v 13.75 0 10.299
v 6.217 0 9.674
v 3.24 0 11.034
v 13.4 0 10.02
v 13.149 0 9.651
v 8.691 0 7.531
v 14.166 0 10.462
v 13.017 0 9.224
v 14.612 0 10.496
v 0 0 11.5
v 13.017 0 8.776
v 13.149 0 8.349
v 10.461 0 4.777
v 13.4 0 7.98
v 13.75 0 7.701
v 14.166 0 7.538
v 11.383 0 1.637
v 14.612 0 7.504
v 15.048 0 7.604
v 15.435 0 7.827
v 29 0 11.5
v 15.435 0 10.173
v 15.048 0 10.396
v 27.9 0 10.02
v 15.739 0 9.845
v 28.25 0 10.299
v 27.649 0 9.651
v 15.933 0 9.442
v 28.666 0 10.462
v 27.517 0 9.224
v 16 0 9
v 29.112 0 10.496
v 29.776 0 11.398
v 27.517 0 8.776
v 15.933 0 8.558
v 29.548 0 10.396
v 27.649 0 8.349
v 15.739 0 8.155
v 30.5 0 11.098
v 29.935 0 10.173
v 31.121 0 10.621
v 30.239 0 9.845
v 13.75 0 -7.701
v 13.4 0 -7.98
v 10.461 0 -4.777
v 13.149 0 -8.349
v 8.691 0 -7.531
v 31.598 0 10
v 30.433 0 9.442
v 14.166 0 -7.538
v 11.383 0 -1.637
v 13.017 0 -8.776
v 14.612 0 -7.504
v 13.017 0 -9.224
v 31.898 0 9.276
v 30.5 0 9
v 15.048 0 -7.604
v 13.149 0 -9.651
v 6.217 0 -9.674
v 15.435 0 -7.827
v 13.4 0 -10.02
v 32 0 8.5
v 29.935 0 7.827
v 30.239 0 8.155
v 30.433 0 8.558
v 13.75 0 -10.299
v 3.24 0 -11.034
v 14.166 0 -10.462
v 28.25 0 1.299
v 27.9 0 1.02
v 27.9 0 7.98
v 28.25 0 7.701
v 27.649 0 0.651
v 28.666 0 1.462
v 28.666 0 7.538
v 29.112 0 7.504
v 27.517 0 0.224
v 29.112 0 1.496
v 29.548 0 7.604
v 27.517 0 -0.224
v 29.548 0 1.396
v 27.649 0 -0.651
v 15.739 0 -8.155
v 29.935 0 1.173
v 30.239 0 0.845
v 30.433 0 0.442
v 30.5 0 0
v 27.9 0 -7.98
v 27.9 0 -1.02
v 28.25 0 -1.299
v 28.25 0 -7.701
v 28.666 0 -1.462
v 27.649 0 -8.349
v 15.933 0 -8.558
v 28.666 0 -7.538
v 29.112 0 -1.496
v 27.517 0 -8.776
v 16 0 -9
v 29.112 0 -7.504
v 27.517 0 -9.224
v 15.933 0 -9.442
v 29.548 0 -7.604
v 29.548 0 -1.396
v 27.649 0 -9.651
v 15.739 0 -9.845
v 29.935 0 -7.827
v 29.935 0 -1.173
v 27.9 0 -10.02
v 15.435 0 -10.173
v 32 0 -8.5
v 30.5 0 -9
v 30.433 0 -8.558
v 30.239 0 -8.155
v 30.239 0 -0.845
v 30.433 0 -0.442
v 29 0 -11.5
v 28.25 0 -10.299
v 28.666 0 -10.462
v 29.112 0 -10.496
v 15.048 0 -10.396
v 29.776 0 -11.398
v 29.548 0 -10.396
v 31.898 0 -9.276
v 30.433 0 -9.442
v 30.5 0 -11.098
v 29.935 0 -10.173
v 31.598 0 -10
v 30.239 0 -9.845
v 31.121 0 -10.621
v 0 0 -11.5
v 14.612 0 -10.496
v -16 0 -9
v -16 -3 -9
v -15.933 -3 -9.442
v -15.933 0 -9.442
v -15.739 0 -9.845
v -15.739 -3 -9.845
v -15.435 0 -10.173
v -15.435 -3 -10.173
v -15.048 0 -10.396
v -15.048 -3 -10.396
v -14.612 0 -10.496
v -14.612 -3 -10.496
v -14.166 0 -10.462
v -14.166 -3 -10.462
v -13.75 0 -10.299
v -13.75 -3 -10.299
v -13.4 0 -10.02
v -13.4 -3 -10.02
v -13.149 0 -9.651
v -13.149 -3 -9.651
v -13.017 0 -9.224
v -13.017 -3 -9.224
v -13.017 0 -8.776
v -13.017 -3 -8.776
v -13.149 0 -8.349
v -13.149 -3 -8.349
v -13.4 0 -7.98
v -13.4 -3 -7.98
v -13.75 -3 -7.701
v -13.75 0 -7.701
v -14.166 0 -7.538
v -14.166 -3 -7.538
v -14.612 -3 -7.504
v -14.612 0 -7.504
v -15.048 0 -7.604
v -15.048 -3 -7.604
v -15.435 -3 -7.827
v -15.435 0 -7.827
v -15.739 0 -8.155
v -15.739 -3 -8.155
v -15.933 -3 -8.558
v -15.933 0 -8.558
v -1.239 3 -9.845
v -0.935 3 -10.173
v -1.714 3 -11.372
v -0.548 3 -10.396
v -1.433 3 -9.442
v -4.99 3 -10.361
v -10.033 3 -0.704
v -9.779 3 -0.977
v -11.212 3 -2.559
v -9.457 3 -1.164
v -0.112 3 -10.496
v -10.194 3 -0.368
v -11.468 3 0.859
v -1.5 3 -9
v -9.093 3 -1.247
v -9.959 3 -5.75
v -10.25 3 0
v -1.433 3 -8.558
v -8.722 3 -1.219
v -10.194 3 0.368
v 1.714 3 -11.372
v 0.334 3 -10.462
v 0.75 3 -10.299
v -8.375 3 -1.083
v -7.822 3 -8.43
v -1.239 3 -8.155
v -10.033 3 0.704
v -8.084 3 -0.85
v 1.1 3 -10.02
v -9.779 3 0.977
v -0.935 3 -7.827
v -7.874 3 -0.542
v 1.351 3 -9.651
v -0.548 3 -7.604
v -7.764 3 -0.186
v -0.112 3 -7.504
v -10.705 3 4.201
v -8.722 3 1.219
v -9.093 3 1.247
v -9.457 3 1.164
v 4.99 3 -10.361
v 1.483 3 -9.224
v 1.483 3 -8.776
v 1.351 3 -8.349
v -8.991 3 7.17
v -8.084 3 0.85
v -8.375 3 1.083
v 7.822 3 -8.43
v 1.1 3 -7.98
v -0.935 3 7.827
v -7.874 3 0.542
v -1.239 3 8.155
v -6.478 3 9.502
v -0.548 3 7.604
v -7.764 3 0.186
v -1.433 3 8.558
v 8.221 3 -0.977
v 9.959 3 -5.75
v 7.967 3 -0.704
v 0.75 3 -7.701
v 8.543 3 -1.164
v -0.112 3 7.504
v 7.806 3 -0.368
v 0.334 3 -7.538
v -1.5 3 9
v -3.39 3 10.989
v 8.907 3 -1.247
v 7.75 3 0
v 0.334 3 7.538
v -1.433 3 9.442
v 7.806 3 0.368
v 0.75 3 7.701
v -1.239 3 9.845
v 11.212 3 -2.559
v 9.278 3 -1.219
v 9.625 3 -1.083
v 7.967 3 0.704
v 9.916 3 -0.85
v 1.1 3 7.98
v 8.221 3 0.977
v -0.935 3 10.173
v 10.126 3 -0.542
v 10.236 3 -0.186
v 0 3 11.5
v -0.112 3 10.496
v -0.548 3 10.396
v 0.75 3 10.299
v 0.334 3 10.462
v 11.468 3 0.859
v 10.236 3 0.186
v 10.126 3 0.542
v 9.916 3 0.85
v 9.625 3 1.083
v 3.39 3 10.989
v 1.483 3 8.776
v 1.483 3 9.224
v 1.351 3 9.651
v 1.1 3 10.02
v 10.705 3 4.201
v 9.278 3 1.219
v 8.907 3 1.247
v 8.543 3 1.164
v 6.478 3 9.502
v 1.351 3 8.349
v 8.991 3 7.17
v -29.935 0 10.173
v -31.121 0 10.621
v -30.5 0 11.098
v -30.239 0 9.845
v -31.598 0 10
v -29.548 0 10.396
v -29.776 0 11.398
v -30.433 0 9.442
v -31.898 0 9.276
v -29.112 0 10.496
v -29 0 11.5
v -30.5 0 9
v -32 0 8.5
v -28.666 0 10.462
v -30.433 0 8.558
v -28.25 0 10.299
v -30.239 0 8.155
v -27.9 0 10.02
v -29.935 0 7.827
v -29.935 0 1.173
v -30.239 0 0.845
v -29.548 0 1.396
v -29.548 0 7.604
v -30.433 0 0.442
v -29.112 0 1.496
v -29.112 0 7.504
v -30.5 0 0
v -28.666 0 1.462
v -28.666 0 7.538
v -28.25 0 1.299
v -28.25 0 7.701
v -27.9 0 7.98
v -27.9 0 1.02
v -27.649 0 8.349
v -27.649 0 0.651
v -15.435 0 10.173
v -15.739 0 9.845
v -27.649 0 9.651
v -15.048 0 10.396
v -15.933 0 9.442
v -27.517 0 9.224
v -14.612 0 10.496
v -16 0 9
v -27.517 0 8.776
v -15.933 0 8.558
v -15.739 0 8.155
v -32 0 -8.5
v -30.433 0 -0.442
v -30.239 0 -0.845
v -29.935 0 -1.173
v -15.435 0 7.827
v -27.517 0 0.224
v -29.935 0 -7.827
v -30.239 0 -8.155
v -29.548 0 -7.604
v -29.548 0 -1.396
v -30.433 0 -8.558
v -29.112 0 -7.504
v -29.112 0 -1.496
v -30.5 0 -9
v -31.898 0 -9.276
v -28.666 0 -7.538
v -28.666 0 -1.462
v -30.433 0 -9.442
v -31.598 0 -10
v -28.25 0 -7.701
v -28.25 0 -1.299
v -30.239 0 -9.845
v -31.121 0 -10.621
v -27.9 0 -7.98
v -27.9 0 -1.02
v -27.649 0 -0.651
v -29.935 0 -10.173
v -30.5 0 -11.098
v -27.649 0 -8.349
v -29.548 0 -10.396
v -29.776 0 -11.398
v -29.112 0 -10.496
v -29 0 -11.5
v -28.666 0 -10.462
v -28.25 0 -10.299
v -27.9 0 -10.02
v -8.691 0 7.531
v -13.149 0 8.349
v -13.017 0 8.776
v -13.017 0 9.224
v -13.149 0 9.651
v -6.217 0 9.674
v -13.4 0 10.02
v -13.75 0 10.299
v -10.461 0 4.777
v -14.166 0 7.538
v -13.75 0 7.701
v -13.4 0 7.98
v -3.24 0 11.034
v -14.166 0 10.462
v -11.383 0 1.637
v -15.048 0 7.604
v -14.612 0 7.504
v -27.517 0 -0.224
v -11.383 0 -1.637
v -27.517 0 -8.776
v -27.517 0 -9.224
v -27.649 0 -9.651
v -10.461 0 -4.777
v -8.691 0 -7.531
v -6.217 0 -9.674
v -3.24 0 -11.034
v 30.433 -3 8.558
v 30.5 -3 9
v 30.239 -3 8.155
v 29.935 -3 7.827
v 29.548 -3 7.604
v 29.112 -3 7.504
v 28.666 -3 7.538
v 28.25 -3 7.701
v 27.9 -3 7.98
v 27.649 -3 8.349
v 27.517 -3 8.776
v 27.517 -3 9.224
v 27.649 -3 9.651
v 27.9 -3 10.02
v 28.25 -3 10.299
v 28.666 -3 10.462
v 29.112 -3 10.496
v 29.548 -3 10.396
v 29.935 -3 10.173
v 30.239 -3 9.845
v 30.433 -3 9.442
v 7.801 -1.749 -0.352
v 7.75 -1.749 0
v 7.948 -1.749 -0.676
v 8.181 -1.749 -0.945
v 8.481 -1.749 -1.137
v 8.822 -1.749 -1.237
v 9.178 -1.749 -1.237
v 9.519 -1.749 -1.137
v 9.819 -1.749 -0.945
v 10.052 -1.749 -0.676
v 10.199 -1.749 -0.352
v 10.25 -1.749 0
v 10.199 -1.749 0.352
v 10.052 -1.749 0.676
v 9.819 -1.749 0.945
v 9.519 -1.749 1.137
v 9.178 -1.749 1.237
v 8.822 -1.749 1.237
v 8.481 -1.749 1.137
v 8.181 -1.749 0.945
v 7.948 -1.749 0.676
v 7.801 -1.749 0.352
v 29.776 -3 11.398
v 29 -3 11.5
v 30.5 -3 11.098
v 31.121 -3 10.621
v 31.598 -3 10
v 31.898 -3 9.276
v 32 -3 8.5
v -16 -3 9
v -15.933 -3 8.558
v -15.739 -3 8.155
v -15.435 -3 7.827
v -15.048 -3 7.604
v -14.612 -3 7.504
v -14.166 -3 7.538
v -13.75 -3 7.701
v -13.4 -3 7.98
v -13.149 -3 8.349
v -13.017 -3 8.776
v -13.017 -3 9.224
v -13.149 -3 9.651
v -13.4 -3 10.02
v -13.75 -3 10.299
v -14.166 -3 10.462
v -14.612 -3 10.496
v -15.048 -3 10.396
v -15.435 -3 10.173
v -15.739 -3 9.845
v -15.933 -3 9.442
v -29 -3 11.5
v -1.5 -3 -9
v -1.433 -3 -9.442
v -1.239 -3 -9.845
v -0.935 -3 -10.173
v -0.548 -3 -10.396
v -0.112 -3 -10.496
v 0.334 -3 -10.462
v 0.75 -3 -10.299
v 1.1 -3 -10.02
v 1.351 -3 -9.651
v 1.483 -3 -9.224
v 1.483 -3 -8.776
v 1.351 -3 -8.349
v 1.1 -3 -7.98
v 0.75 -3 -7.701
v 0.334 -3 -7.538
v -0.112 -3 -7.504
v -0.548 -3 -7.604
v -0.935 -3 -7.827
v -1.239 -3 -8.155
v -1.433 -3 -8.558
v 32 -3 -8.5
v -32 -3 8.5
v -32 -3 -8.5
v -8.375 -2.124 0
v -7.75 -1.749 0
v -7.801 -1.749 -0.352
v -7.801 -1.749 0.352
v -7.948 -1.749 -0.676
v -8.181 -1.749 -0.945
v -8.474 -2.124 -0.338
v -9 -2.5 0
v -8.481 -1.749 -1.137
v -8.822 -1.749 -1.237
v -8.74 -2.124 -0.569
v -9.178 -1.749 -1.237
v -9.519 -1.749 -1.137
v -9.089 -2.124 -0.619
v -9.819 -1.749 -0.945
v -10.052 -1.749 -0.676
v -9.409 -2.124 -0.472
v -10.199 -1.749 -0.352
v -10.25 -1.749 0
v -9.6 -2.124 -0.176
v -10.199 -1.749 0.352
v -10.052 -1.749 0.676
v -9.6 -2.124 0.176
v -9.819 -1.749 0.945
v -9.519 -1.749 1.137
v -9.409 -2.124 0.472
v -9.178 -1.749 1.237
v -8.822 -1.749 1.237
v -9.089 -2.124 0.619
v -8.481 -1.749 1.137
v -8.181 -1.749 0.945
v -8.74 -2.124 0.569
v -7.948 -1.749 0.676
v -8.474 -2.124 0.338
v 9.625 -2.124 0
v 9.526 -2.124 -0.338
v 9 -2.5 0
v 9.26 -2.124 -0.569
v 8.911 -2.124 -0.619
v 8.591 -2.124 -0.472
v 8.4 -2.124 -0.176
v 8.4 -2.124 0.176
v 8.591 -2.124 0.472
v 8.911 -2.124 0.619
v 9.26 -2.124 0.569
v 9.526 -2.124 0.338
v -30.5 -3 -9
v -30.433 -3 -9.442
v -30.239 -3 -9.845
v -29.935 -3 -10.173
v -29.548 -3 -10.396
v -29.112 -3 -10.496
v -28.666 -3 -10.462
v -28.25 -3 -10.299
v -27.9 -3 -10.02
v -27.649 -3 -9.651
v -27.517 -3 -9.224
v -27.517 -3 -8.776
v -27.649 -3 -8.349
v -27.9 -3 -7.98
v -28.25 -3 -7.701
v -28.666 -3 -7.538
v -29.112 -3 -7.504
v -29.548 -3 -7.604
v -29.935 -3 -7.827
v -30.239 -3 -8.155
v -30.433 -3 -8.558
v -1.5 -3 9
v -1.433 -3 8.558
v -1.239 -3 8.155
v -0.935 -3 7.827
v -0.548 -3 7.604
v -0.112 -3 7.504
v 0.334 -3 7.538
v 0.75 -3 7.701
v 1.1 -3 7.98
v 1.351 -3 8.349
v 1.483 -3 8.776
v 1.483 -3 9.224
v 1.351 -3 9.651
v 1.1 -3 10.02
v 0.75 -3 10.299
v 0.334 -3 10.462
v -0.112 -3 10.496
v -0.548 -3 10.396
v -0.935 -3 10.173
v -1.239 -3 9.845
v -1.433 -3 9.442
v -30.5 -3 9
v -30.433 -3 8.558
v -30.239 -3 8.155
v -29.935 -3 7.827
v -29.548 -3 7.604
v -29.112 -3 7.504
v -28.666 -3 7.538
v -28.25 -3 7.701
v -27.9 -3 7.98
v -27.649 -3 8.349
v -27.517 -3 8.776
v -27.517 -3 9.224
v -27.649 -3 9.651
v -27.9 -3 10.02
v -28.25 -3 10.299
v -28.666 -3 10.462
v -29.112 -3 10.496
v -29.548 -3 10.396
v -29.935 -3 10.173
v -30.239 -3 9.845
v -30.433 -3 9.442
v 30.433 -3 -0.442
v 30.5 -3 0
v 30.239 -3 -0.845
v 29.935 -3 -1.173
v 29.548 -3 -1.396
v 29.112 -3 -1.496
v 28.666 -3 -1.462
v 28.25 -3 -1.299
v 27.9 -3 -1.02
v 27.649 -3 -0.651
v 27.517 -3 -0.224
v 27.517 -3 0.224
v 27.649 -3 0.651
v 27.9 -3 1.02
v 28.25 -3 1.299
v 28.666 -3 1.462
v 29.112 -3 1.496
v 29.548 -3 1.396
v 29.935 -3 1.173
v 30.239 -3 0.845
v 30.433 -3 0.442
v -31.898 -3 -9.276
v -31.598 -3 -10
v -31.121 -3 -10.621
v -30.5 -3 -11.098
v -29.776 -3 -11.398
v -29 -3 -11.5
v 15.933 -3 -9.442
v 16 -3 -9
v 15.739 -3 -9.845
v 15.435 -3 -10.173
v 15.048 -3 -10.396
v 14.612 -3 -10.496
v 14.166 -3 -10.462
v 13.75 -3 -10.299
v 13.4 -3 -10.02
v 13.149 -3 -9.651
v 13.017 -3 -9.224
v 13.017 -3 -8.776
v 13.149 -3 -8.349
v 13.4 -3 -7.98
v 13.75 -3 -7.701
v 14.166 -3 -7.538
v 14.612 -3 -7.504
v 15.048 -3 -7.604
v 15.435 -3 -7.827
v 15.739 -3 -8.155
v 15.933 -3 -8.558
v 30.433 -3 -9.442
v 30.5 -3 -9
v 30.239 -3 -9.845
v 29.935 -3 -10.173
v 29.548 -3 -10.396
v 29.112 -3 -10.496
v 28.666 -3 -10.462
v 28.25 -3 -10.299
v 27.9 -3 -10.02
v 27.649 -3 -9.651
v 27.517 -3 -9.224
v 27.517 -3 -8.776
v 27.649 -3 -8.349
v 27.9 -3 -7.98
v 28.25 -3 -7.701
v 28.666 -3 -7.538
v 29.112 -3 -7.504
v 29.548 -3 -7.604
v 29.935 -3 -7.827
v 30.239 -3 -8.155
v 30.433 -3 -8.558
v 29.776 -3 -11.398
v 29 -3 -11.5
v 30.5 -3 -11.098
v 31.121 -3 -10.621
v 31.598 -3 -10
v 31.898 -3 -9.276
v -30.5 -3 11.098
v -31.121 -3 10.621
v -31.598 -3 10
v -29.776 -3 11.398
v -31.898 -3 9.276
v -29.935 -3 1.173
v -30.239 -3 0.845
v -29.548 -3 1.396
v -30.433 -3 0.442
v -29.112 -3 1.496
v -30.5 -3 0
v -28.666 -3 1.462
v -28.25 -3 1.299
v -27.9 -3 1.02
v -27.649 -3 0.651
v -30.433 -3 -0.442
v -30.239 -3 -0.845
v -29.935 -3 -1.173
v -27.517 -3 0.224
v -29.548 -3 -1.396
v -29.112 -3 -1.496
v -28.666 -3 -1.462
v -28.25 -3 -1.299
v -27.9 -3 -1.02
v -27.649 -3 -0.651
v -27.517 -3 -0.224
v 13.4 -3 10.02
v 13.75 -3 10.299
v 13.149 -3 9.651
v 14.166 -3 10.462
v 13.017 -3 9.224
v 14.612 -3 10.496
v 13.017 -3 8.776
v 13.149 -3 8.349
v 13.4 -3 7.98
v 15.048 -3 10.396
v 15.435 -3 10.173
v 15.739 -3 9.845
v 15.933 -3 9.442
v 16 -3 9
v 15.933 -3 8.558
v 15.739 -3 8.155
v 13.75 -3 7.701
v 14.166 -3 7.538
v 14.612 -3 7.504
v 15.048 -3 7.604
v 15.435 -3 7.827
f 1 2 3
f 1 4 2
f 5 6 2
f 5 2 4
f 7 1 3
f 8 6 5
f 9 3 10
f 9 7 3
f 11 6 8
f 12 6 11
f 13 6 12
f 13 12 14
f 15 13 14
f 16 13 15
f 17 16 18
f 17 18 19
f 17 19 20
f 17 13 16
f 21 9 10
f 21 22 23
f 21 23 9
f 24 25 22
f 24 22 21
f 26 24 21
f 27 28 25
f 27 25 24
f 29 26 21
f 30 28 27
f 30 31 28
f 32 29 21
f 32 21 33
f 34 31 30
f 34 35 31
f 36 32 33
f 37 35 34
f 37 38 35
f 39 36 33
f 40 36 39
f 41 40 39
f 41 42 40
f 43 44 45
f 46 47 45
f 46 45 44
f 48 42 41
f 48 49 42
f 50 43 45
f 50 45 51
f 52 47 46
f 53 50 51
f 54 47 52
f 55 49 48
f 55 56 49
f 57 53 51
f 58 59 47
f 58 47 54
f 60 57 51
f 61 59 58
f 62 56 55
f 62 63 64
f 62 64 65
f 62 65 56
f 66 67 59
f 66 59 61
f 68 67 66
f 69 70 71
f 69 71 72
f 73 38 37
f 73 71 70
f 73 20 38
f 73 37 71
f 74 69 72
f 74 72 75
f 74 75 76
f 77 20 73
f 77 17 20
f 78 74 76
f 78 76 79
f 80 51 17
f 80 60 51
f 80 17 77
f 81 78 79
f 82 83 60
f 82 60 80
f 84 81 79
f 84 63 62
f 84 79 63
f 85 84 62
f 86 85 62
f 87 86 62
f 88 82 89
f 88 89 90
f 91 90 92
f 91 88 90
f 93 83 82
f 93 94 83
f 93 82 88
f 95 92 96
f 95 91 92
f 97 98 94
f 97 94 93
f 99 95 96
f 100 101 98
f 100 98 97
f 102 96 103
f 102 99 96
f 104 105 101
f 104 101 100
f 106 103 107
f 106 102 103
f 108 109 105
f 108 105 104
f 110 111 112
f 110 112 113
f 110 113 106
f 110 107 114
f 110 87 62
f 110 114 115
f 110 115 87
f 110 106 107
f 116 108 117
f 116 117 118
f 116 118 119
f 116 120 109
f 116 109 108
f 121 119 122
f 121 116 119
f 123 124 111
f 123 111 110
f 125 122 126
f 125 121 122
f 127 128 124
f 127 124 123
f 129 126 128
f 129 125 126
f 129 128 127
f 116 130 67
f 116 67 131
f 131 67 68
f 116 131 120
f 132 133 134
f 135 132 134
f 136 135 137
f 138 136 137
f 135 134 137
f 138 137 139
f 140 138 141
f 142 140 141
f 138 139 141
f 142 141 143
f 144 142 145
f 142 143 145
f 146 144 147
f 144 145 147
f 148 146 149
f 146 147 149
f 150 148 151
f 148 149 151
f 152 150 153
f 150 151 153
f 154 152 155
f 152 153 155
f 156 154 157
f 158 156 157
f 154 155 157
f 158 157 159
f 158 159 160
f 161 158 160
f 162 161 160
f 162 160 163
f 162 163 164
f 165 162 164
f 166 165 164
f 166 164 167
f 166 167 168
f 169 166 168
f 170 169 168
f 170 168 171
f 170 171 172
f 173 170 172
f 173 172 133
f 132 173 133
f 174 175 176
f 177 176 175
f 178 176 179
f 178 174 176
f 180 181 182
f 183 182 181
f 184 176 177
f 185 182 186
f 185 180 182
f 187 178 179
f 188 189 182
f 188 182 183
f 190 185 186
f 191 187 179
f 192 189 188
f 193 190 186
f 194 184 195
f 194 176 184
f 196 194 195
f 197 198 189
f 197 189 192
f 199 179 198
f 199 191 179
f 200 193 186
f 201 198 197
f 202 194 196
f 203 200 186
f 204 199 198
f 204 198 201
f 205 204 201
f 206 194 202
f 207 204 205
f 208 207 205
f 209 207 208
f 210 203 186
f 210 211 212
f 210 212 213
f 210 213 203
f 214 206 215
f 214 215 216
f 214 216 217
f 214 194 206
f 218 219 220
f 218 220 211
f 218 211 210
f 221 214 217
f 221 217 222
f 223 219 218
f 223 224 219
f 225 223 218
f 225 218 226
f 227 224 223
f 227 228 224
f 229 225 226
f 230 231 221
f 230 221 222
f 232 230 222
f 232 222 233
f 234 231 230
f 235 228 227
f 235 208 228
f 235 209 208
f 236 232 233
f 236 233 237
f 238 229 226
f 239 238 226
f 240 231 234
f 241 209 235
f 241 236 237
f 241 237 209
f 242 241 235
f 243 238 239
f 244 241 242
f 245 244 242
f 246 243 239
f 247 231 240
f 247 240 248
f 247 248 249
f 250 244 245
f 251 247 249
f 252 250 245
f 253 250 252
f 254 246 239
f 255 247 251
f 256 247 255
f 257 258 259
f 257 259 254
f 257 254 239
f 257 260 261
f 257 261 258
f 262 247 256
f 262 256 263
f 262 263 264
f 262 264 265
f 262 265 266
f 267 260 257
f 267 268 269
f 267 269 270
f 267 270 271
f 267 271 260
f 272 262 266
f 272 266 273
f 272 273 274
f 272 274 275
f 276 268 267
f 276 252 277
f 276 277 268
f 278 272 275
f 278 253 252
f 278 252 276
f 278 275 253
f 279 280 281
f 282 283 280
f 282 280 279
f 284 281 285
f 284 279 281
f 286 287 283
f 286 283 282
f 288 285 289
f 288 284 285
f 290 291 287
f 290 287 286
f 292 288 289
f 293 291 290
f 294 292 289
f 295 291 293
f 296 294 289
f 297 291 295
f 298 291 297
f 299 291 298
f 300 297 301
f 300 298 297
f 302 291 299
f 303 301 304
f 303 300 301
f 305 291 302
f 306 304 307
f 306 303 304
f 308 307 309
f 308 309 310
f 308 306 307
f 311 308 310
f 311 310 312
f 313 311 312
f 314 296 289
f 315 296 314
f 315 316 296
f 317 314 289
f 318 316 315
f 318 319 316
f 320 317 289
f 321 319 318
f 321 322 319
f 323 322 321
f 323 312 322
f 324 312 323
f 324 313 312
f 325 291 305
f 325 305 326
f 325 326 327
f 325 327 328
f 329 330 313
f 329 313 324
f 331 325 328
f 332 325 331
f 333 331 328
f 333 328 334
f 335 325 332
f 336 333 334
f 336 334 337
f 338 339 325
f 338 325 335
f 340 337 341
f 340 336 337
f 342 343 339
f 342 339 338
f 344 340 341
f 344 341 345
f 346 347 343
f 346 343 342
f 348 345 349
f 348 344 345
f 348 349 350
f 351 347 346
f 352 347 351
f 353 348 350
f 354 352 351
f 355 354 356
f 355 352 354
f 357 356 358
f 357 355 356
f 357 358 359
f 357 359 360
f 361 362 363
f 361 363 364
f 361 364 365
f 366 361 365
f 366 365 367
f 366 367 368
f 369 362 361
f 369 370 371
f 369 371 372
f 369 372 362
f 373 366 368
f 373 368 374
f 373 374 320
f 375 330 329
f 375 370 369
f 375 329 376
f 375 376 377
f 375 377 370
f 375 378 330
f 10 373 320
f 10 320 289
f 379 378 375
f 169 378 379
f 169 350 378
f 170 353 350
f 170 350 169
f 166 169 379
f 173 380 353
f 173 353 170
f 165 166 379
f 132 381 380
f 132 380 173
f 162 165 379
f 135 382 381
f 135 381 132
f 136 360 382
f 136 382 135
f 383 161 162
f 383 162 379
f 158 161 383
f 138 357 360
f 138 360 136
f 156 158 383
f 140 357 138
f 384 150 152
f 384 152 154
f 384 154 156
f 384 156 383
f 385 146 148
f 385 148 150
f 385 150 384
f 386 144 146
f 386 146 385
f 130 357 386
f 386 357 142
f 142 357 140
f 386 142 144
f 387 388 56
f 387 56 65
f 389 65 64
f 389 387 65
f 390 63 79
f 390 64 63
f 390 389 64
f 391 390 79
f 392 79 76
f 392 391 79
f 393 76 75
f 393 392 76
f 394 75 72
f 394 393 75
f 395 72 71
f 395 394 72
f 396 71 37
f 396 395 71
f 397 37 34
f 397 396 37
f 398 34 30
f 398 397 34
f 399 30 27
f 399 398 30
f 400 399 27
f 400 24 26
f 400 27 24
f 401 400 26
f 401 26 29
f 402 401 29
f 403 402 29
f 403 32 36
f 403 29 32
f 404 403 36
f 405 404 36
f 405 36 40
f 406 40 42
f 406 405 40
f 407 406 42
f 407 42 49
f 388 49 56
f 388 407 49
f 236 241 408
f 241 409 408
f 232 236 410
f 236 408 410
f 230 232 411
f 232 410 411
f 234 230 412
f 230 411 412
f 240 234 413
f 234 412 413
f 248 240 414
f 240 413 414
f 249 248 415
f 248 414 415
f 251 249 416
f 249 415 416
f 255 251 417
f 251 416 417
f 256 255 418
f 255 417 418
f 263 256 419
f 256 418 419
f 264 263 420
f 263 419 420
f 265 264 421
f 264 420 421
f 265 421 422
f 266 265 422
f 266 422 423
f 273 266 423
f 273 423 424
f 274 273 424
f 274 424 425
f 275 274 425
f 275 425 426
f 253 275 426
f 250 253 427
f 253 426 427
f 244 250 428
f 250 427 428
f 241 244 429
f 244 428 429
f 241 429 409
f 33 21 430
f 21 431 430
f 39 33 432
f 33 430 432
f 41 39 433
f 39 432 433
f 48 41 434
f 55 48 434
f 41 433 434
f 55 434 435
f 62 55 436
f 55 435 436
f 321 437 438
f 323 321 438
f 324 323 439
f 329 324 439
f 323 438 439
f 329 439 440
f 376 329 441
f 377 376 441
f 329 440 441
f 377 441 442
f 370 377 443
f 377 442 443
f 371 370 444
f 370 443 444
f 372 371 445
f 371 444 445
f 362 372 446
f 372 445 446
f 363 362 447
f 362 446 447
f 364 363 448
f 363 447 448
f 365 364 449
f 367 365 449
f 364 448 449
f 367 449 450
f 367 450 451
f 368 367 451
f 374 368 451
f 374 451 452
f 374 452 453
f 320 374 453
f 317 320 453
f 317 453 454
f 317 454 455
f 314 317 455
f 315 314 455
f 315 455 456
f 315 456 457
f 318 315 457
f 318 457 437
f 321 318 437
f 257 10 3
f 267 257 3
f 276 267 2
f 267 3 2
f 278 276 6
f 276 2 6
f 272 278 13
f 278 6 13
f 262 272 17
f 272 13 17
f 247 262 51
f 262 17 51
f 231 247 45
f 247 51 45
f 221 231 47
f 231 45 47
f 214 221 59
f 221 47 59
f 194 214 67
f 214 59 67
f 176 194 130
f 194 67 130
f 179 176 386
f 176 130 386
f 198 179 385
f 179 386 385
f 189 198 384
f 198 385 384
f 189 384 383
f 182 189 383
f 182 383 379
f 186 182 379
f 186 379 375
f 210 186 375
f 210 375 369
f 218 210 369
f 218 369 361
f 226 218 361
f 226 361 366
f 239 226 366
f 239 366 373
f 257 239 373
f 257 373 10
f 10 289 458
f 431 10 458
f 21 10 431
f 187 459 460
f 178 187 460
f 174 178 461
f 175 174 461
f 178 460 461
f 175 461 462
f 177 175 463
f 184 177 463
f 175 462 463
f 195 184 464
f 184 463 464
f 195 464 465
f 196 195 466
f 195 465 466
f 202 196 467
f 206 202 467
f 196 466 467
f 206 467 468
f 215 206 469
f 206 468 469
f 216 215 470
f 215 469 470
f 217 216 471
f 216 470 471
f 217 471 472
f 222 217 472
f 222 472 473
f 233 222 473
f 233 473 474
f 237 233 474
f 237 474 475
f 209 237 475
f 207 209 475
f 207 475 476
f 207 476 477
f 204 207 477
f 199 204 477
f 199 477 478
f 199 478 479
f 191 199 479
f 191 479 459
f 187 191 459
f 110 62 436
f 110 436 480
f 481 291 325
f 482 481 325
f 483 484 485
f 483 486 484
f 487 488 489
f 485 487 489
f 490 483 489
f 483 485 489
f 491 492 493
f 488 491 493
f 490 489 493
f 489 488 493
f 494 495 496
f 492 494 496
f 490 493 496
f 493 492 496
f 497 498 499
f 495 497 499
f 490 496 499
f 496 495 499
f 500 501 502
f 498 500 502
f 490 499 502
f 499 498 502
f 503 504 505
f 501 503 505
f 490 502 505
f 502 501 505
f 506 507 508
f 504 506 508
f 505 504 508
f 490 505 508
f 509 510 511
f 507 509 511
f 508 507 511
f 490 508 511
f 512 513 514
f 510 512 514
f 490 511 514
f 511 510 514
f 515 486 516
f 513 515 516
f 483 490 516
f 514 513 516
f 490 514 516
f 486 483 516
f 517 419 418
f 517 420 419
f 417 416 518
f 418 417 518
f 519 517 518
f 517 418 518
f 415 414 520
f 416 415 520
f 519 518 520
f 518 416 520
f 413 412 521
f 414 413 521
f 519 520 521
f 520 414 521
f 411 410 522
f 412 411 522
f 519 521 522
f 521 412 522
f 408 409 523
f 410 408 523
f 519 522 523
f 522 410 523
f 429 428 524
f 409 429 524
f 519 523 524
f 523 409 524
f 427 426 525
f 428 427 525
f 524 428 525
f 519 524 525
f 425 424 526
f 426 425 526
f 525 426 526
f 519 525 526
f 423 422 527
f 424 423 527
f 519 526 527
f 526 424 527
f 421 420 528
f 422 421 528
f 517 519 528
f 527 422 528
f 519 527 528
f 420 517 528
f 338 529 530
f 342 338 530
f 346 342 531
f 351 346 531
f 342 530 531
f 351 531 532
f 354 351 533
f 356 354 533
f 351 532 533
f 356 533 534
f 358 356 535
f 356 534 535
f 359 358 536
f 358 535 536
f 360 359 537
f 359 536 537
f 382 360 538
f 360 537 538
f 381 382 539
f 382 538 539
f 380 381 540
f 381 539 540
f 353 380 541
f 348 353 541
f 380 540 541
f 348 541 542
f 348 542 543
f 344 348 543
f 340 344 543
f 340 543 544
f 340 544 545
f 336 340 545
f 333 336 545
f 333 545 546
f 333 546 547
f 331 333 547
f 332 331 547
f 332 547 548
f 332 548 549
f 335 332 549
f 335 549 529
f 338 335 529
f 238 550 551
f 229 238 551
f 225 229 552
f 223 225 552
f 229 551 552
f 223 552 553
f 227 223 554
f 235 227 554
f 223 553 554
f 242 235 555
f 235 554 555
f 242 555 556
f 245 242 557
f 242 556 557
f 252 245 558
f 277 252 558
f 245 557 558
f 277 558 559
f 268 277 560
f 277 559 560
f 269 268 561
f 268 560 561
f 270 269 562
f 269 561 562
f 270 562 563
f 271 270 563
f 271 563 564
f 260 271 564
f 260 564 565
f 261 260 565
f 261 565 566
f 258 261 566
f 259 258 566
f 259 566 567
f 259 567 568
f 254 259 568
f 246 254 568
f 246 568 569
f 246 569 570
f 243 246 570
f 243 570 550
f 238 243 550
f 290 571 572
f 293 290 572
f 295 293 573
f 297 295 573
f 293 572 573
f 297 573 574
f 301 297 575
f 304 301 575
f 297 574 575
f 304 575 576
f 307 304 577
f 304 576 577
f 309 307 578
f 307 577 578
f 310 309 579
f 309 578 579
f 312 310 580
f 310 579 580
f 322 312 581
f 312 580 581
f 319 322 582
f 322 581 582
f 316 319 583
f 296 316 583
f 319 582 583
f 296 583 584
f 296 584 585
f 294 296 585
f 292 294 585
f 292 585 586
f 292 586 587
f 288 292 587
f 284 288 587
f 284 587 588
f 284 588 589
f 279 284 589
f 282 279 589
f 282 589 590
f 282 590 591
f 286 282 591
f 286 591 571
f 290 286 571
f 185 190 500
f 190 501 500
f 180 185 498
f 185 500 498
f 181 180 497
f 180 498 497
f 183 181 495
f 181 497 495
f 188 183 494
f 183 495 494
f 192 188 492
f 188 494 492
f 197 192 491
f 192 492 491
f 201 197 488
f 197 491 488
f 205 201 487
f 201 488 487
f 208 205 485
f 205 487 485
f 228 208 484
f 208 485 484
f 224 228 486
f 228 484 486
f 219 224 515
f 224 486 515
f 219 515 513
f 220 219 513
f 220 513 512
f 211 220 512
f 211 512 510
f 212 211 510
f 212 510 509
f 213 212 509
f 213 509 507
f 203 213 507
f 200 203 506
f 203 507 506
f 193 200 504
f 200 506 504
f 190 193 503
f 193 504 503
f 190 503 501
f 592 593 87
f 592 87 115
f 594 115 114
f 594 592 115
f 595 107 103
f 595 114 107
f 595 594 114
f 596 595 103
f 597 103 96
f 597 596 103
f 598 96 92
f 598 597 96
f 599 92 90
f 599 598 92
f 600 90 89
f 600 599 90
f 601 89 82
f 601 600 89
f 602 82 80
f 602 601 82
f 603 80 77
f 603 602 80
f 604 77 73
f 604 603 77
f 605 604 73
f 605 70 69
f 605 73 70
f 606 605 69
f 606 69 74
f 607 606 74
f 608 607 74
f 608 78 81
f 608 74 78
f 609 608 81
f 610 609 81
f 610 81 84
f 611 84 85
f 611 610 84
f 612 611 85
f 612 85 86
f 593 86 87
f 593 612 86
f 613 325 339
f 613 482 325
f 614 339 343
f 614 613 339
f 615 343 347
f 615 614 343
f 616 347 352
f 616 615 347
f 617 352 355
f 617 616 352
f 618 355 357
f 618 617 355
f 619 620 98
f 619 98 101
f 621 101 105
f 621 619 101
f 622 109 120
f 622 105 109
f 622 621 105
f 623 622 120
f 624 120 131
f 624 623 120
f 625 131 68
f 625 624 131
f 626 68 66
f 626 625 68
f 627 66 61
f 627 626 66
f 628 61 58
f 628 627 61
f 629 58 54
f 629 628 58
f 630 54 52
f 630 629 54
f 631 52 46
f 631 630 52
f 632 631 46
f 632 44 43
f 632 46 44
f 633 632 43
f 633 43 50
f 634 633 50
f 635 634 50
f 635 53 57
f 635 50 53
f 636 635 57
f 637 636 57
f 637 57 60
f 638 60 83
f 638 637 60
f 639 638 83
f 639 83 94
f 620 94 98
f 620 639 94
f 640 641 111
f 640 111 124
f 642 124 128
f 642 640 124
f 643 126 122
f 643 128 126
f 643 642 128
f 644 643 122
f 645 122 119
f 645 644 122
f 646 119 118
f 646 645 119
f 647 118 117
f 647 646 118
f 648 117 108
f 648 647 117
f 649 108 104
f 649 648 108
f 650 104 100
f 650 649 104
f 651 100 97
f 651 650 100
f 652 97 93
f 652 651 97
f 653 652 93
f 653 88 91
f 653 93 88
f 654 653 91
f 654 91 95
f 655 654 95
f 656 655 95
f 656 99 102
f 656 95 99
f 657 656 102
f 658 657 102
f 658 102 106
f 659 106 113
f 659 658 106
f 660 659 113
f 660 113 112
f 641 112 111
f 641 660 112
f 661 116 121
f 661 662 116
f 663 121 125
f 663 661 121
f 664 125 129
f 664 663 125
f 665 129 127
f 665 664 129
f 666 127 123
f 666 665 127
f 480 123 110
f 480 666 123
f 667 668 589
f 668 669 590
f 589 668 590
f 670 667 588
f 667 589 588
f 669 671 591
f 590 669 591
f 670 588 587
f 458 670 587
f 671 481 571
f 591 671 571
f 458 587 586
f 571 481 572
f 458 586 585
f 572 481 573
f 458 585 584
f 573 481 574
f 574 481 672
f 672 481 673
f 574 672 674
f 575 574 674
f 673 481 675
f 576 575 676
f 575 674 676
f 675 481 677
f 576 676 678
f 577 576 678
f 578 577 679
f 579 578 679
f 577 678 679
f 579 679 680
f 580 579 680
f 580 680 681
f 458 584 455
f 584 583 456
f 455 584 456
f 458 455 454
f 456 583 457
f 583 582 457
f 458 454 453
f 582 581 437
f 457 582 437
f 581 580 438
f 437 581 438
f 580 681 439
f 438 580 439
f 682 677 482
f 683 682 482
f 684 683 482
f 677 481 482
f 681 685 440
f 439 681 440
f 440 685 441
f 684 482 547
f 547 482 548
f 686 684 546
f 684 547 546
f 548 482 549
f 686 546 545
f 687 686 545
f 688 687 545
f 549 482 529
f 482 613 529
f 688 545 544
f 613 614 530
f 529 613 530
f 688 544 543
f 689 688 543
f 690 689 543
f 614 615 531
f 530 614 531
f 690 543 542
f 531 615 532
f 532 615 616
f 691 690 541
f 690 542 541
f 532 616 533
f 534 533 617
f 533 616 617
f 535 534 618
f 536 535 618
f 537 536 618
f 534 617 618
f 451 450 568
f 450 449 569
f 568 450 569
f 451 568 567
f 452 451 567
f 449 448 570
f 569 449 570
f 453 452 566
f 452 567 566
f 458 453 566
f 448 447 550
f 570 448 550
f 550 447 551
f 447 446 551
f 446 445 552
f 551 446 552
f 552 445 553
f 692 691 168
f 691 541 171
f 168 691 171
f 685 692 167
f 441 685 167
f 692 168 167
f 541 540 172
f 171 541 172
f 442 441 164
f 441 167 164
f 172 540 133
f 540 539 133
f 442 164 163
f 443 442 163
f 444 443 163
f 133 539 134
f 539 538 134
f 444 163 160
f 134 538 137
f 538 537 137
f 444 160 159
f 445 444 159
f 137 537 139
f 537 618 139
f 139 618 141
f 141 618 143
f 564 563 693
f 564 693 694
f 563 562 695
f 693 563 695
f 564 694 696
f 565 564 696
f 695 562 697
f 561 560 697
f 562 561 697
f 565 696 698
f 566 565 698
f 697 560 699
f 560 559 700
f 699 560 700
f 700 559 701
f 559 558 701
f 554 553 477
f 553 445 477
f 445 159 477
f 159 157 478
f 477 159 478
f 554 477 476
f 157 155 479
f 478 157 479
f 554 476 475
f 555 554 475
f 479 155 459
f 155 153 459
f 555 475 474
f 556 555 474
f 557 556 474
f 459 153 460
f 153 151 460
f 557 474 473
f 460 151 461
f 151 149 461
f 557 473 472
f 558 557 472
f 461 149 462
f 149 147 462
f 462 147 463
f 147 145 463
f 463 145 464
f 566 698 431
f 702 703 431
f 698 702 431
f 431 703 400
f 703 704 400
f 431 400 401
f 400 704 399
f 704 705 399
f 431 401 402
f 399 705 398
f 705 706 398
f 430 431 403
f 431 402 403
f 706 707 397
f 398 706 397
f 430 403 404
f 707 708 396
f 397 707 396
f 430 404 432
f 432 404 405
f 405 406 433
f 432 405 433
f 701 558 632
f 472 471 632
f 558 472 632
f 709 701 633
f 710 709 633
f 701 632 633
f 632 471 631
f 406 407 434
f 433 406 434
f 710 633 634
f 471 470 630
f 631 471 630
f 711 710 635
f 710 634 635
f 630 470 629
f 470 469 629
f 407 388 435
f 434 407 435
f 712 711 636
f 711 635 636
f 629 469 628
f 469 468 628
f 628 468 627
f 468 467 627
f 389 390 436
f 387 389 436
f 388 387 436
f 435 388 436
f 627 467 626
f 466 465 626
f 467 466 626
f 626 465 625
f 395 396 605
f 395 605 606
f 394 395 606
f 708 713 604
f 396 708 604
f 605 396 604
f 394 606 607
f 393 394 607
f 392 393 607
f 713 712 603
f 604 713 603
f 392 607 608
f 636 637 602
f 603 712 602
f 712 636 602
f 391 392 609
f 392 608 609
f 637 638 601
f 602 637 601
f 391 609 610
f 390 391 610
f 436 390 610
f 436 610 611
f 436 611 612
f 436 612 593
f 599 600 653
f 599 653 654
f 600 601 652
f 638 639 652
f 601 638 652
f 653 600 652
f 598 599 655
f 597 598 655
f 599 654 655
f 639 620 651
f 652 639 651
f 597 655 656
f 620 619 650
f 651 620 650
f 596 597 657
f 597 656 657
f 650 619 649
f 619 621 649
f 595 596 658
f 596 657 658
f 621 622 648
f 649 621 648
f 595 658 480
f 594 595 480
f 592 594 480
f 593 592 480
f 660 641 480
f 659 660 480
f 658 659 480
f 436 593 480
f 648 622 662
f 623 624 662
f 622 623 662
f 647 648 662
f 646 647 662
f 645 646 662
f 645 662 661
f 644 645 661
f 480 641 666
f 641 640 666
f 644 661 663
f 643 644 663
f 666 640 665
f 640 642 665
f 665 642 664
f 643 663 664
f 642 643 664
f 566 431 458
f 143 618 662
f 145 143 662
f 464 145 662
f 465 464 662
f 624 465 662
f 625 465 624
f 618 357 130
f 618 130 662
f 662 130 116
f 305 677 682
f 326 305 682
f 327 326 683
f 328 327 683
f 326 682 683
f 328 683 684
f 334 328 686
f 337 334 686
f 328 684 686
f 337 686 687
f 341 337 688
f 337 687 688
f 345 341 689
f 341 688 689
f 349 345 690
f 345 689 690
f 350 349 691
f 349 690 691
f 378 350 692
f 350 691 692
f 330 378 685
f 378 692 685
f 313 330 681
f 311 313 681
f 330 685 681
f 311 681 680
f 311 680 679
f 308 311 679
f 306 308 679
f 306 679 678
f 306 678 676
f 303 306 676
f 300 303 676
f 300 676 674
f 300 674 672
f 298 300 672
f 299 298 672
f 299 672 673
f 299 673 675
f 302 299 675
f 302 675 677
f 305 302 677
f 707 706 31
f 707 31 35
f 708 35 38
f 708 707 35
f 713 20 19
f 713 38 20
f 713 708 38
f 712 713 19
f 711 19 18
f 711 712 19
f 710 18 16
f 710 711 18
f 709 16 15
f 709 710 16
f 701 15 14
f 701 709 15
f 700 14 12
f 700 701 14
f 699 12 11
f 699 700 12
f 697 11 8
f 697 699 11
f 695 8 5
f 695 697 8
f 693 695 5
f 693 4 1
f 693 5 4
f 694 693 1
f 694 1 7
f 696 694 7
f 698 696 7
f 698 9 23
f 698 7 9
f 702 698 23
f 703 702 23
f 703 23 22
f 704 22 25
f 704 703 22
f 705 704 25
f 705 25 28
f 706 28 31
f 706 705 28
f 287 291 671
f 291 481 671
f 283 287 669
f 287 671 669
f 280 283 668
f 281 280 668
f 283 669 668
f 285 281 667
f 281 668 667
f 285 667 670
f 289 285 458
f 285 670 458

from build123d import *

# Parameters (mm, degrees)
SKETCH1_W                 = 64
SKETCH1_H                 = 23
BOSS_EXTRUDE1_DEPTH       = 3
F_3_0_3_DIAMETER_HOLE1_D  = 3
FILLET1_R                 = 3
SKETCH5_R                 = 11.5
BOSS_EXTRUDE2_DEPTH       = 3
F_3_0_3_DIAMETER_HOLE2_D  = 3
M3X0_5_TAPPED_HOLE1_D     = 2.5
M3X0_5_TAPPED_HOLE1_DEPTH = 4.748924226
M3X0_5_TAPPED_HOLE1_TIP   = 0.751075774


with BuildPart() as part:
    # Sketch1 → Boss-Extrude1 (new body)
    with BuildSketch(Plane(origin=(0, 0, 0), x_dir=(1, 0, 0), z_dir=(0, 1, 0))):
        Rectangle(SKETCH1_W, SKETCH1_H)
    extrude(amount=-BOSS_EXTRUDE1_DEPTH)

    # Ø3.0 (3) Diameter Hole1 (through all)
    with Locations(Plane(origin=(0, 0, 0), x_dir=(1, 0, 0), z_dir=(0, 1, 0))):
        with Locations((-29, 0), (-29, 9), (-14.5, 9), (-14.5, -9), (-29, -9)):
            f_3_0_3_diameter_hole1 = Hole(F_3_0_3_DIAMETER_HOLE1_D / 2)

    # Mirror1: Ø3.0 (3) Diameter Hole1 across plane
    add(f_3_0_3_diameter_hole1.mirror(Plane(origin=(0, 0, 0), x_dir=(0, 0, 1), z_dir=(1, 0, 0))), mode=Mode.SUBTRACT)

    # Fillet1
    fillet1_edges = [part.edges().sort_by_distance(p)[0] for p in [
        (32, -1.5, 11.5),
        (-32, -1.5, 11.5),
        (-32, -1.5, -11.5),
        (32, -1.5, -11.5),
    ]]
    fillet(fillet1_edges, radius=FILLET1_R)

    # Sketch5 → Boss-Extrude2 (add)
    with BuildSketch(Plane(origin=(0, 0, 0), x_dir=(1, 0, 0), z_dir=(0, 1, 0))):
        with Locations(Location((0, 0, 0), (0, 0, 270))):
            Circle(SKETCH5_R)
    extrude(amount=BOSS_EXTRUDE2_DEPTH)

    # Ø3.0 (3) Diameter Hole2 (through all)
    with Locations(Plane(origin=(0, 3, 0), x_dir=(1, 0, 0), z_dir=(0, 1, 0))):
        with Locations((0, 9), (0, -9)):
            Hole(F_3_0_3_DIAMETER_HOLE2_D / 2)

    # M3x0.5 Tapped Hole1
    with Locations(Plane(origin=(0, 3, 0), x_dir=(1, 0, 0), z_dir=(0, 1, 0))):
        with Locations((-9, 0), (9, 0)):
            Hole(M3X0_5_TAPPED_HOLE1_D / 2, depth=M3X0_5_TAPPED_HOLE1_DEPTH)
            with Locations((0, 0, -(M3X0_5_TAPPED_HOLE1_DEPTH + M3X0_5_TAPPED_HOLE1_TIP / 2))):  # 118° drill point
                Cone(0, M3X0_5_TAPPED_HOLE1_D / 2, M3X0_5_TAPPED_HOLE1_TIP, mode=Mode.SUBTRACT)


solid = part.part
